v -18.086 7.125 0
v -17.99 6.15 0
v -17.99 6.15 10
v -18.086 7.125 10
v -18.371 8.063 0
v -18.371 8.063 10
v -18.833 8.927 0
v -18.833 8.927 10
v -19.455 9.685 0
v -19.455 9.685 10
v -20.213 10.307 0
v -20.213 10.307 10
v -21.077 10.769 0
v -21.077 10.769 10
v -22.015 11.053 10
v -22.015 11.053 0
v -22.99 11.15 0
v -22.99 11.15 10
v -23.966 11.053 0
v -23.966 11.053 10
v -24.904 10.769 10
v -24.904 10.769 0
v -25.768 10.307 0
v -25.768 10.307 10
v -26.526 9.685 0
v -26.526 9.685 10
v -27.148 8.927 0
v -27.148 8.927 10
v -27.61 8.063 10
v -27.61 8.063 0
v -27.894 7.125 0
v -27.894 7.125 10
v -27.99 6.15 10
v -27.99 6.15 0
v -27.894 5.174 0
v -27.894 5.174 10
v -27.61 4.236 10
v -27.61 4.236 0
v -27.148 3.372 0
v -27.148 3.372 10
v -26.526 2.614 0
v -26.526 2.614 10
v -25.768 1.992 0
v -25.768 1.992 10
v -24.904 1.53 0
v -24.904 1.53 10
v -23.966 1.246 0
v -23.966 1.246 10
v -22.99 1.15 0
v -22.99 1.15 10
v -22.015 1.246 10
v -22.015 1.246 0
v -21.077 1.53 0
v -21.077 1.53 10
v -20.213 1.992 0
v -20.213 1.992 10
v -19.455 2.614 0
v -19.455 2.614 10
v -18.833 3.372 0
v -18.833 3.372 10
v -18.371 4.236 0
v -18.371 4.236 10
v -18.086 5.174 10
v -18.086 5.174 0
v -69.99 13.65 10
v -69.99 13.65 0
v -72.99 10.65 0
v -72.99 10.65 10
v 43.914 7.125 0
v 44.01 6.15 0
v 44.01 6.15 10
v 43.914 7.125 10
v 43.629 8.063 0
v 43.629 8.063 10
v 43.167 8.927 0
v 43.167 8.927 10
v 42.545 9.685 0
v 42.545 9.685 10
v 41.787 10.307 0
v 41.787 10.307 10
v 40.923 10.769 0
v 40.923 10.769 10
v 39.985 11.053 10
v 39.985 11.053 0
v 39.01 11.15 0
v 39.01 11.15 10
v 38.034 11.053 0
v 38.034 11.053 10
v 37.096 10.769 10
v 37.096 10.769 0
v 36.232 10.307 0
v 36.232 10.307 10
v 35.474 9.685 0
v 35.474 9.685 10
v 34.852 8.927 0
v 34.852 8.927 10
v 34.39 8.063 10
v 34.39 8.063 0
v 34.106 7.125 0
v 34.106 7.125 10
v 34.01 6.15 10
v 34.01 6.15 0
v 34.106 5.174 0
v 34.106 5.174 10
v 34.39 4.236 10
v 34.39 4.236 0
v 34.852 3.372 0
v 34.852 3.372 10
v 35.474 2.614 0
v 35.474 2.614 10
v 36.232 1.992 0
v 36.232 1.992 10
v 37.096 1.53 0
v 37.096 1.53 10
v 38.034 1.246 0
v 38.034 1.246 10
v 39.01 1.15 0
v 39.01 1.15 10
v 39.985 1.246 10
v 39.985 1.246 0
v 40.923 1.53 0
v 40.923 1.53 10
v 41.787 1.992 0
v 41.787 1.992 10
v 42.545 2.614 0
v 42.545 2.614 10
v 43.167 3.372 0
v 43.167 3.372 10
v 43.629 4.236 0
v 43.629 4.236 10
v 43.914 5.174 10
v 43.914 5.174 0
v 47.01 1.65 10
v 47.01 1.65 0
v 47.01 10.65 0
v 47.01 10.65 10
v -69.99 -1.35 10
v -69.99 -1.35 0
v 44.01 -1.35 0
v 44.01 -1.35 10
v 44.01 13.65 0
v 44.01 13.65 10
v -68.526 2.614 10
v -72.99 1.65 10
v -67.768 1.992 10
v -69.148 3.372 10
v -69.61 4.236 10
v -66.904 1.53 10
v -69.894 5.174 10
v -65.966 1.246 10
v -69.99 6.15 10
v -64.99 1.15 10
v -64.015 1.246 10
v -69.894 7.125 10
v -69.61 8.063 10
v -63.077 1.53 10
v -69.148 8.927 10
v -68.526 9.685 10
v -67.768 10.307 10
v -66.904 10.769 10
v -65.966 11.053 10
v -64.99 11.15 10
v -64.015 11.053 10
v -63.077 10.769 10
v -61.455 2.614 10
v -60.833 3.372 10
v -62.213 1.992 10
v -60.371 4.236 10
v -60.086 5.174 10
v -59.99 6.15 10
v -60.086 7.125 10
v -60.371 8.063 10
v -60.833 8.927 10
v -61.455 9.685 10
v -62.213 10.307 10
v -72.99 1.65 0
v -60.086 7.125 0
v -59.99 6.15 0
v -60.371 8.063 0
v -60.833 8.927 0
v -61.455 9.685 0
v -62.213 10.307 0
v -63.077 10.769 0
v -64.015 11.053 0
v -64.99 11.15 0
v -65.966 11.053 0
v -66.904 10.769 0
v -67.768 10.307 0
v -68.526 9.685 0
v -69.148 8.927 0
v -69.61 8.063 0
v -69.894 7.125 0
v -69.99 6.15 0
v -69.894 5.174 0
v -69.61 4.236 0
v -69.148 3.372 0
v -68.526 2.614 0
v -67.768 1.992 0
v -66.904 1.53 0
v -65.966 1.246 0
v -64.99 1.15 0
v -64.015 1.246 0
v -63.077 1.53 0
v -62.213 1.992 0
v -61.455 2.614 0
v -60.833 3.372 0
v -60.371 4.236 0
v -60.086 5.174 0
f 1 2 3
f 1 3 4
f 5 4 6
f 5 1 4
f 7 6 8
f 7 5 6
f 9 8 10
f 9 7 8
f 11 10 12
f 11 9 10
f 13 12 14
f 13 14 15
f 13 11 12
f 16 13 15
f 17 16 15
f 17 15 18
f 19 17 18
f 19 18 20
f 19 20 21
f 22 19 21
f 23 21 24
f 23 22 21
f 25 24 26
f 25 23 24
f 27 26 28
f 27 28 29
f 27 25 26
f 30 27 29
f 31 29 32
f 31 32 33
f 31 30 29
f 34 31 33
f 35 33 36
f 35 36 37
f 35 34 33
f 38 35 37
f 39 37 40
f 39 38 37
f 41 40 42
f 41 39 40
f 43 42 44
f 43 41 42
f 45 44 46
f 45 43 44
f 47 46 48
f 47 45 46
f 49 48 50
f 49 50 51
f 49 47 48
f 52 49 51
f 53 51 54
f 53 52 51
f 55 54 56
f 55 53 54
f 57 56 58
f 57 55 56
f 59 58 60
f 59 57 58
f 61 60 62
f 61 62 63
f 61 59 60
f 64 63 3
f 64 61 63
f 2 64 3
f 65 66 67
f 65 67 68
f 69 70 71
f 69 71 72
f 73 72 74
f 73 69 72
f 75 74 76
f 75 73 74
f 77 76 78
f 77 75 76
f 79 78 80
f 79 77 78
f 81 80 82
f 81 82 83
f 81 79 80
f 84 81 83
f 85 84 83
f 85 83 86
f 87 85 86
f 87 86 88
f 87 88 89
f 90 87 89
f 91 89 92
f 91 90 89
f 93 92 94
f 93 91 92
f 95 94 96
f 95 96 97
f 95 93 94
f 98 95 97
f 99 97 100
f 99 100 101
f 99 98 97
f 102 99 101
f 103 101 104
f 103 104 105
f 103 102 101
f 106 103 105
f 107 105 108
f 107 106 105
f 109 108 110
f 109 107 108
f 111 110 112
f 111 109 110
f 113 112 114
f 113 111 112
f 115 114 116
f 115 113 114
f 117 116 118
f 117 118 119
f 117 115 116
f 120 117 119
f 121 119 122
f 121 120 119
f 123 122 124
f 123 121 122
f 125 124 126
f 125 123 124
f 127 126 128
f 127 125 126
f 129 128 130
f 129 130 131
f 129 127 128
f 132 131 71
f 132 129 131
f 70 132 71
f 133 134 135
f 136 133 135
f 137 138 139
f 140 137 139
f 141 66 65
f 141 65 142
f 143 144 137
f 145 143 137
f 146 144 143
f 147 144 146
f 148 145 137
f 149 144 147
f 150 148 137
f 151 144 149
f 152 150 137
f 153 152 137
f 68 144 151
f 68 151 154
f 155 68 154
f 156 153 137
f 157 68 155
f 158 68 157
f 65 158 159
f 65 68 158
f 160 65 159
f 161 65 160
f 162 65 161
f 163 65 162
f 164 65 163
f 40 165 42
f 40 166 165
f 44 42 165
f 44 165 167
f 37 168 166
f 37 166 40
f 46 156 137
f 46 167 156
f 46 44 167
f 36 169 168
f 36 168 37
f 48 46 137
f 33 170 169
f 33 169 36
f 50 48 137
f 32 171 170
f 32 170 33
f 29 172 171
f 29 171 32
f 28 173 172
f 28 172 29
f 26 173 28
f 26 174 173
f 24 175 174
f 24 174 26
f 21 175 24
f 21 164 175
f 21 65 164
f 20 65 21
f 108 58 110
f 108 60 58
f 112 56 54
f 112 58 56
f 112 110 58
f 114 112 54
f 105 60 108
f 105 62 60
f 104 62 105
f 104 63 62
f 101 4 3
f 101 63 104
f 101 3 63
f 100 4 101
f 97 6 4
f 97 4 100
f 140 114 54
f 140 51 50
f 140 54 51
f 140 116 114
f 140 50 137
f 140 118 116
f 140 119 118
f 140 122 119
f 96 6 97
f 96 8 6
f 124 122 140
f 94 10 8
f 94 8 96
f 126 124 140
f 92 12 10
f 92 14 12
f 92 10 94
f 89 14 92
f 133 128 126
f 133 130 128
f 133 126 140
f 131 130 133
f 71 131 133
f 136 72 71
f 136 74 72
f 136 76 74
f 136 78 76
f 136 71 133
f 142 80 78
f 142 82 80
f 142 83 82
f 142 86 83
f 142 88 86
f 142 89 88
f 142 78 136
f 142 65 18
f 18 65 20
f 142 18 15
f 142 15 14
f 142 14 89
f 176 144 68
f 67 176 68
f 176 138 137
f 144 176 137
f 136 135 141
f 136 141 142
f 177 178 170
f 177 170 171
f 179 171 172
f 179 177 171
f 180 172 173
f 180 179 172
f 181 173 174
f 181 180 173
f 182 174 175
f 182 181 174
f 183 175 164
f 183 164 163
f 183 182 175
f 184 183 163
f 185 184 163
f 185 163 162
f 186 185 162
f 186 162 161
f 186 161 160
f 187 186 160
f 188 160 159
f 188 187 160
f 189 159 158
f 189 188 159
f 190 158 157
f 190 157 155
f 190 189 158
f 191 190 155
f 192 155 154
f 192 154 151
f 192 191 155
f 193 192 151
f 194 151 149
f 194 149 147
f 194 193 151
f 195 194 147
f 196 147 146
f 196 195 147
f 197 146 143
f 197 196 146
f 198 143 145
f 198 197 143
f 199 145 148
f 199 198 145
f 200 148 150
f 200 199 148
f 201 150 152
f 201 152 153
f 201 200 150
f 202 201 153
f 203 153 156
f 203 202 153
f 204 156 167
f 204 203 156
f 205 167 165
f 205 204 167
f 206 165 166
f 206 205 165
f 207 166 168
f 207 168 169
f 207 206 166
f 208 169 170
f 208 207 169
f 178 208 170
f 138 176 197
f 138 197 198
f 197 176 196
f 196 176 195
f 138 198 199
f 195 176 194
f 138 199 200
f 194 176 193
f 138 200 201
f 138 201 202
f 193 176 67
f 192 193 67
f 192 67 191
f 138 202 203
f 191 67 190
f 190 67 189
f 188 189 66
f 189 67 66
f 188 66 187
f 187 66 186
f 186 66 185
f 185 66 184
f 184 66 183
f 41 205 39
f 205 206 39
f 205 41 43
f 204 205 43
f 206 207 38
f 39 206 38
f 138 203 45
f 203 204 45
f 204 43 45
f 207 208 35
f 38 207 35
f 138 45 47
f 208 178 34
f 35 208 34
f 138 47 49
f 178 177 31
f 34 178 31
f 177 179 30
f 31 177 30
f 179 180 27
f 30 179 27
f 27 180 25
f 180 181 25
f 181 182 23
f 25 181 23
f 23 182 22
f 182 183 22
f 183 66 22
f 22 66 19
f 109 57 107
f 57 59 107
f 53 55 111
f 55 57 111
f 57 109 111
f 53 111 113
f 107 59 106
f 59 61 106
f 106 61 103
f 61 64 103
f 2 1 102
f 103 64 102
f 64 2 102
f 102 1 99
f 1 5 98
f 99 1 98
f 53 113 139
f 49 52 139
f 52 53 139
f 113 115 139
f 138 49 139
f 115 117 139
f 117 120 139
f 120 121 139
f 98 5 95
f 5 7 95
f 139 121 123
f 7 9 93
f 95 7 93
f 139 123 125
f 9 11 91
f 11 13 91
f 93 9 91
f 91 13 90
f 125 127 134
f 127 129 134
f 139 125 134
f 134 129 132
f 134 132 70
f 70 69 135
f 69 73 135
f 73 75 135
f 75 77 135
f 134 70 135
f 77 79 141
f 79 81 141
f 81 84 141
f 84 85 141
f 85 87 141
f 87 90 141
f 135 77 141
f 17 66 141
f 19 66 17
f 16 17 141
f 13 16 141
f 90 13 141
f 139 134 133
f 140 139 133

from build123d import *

# Parameters (mm, degrees)
SKETCH_1_W      = 120
SKETCH_1_H      = 15
SKETCH_1_R      = 5
EXTRUDE_2_DEPTH = 10
CHAMFER_2_SIZE  = 3


with BuildPart() as part:
    # 草图1 → 凸台-拉伸2 (new body)
    with BuildSketch(Plane.XY):
        with Locations((-12.990353698, 6.149517685)):
            Rectangle(SKETCH_1_W, SKETCH_1_H)
        with Locations((-64.990353698, 6.149517685)):
            Circle(SKETCH_1_R, mode=Mode.SUBTRACT)
        with Locations((39.009646302, 6.149517685)):
            Circle(SKETCH_1_R, mode=Mode.SUBTRACT)
        with Locations((-22.990353698, 6.149517685)):
            Circle(SKETCH_1_R, mode=Mode.SUBTRACT)
    extrude(amount=EXTRUDE_2_DEPTH)

    # 倒角2
    chamfer_2_edges = [part.edges().sort_by_distance(p)[0] for p in [
        (47.009646302, -1.350482315, 5),
        (-72.990353698, -1.350482315, 5),
        (-72.990353698, 13.649517685, 5),
        (47.009646302, 13.649517685, 5),
    ]]
    chamfer(chamfer_2_edges, length=CHAMFER_2_SIZE)


solid = part.part
